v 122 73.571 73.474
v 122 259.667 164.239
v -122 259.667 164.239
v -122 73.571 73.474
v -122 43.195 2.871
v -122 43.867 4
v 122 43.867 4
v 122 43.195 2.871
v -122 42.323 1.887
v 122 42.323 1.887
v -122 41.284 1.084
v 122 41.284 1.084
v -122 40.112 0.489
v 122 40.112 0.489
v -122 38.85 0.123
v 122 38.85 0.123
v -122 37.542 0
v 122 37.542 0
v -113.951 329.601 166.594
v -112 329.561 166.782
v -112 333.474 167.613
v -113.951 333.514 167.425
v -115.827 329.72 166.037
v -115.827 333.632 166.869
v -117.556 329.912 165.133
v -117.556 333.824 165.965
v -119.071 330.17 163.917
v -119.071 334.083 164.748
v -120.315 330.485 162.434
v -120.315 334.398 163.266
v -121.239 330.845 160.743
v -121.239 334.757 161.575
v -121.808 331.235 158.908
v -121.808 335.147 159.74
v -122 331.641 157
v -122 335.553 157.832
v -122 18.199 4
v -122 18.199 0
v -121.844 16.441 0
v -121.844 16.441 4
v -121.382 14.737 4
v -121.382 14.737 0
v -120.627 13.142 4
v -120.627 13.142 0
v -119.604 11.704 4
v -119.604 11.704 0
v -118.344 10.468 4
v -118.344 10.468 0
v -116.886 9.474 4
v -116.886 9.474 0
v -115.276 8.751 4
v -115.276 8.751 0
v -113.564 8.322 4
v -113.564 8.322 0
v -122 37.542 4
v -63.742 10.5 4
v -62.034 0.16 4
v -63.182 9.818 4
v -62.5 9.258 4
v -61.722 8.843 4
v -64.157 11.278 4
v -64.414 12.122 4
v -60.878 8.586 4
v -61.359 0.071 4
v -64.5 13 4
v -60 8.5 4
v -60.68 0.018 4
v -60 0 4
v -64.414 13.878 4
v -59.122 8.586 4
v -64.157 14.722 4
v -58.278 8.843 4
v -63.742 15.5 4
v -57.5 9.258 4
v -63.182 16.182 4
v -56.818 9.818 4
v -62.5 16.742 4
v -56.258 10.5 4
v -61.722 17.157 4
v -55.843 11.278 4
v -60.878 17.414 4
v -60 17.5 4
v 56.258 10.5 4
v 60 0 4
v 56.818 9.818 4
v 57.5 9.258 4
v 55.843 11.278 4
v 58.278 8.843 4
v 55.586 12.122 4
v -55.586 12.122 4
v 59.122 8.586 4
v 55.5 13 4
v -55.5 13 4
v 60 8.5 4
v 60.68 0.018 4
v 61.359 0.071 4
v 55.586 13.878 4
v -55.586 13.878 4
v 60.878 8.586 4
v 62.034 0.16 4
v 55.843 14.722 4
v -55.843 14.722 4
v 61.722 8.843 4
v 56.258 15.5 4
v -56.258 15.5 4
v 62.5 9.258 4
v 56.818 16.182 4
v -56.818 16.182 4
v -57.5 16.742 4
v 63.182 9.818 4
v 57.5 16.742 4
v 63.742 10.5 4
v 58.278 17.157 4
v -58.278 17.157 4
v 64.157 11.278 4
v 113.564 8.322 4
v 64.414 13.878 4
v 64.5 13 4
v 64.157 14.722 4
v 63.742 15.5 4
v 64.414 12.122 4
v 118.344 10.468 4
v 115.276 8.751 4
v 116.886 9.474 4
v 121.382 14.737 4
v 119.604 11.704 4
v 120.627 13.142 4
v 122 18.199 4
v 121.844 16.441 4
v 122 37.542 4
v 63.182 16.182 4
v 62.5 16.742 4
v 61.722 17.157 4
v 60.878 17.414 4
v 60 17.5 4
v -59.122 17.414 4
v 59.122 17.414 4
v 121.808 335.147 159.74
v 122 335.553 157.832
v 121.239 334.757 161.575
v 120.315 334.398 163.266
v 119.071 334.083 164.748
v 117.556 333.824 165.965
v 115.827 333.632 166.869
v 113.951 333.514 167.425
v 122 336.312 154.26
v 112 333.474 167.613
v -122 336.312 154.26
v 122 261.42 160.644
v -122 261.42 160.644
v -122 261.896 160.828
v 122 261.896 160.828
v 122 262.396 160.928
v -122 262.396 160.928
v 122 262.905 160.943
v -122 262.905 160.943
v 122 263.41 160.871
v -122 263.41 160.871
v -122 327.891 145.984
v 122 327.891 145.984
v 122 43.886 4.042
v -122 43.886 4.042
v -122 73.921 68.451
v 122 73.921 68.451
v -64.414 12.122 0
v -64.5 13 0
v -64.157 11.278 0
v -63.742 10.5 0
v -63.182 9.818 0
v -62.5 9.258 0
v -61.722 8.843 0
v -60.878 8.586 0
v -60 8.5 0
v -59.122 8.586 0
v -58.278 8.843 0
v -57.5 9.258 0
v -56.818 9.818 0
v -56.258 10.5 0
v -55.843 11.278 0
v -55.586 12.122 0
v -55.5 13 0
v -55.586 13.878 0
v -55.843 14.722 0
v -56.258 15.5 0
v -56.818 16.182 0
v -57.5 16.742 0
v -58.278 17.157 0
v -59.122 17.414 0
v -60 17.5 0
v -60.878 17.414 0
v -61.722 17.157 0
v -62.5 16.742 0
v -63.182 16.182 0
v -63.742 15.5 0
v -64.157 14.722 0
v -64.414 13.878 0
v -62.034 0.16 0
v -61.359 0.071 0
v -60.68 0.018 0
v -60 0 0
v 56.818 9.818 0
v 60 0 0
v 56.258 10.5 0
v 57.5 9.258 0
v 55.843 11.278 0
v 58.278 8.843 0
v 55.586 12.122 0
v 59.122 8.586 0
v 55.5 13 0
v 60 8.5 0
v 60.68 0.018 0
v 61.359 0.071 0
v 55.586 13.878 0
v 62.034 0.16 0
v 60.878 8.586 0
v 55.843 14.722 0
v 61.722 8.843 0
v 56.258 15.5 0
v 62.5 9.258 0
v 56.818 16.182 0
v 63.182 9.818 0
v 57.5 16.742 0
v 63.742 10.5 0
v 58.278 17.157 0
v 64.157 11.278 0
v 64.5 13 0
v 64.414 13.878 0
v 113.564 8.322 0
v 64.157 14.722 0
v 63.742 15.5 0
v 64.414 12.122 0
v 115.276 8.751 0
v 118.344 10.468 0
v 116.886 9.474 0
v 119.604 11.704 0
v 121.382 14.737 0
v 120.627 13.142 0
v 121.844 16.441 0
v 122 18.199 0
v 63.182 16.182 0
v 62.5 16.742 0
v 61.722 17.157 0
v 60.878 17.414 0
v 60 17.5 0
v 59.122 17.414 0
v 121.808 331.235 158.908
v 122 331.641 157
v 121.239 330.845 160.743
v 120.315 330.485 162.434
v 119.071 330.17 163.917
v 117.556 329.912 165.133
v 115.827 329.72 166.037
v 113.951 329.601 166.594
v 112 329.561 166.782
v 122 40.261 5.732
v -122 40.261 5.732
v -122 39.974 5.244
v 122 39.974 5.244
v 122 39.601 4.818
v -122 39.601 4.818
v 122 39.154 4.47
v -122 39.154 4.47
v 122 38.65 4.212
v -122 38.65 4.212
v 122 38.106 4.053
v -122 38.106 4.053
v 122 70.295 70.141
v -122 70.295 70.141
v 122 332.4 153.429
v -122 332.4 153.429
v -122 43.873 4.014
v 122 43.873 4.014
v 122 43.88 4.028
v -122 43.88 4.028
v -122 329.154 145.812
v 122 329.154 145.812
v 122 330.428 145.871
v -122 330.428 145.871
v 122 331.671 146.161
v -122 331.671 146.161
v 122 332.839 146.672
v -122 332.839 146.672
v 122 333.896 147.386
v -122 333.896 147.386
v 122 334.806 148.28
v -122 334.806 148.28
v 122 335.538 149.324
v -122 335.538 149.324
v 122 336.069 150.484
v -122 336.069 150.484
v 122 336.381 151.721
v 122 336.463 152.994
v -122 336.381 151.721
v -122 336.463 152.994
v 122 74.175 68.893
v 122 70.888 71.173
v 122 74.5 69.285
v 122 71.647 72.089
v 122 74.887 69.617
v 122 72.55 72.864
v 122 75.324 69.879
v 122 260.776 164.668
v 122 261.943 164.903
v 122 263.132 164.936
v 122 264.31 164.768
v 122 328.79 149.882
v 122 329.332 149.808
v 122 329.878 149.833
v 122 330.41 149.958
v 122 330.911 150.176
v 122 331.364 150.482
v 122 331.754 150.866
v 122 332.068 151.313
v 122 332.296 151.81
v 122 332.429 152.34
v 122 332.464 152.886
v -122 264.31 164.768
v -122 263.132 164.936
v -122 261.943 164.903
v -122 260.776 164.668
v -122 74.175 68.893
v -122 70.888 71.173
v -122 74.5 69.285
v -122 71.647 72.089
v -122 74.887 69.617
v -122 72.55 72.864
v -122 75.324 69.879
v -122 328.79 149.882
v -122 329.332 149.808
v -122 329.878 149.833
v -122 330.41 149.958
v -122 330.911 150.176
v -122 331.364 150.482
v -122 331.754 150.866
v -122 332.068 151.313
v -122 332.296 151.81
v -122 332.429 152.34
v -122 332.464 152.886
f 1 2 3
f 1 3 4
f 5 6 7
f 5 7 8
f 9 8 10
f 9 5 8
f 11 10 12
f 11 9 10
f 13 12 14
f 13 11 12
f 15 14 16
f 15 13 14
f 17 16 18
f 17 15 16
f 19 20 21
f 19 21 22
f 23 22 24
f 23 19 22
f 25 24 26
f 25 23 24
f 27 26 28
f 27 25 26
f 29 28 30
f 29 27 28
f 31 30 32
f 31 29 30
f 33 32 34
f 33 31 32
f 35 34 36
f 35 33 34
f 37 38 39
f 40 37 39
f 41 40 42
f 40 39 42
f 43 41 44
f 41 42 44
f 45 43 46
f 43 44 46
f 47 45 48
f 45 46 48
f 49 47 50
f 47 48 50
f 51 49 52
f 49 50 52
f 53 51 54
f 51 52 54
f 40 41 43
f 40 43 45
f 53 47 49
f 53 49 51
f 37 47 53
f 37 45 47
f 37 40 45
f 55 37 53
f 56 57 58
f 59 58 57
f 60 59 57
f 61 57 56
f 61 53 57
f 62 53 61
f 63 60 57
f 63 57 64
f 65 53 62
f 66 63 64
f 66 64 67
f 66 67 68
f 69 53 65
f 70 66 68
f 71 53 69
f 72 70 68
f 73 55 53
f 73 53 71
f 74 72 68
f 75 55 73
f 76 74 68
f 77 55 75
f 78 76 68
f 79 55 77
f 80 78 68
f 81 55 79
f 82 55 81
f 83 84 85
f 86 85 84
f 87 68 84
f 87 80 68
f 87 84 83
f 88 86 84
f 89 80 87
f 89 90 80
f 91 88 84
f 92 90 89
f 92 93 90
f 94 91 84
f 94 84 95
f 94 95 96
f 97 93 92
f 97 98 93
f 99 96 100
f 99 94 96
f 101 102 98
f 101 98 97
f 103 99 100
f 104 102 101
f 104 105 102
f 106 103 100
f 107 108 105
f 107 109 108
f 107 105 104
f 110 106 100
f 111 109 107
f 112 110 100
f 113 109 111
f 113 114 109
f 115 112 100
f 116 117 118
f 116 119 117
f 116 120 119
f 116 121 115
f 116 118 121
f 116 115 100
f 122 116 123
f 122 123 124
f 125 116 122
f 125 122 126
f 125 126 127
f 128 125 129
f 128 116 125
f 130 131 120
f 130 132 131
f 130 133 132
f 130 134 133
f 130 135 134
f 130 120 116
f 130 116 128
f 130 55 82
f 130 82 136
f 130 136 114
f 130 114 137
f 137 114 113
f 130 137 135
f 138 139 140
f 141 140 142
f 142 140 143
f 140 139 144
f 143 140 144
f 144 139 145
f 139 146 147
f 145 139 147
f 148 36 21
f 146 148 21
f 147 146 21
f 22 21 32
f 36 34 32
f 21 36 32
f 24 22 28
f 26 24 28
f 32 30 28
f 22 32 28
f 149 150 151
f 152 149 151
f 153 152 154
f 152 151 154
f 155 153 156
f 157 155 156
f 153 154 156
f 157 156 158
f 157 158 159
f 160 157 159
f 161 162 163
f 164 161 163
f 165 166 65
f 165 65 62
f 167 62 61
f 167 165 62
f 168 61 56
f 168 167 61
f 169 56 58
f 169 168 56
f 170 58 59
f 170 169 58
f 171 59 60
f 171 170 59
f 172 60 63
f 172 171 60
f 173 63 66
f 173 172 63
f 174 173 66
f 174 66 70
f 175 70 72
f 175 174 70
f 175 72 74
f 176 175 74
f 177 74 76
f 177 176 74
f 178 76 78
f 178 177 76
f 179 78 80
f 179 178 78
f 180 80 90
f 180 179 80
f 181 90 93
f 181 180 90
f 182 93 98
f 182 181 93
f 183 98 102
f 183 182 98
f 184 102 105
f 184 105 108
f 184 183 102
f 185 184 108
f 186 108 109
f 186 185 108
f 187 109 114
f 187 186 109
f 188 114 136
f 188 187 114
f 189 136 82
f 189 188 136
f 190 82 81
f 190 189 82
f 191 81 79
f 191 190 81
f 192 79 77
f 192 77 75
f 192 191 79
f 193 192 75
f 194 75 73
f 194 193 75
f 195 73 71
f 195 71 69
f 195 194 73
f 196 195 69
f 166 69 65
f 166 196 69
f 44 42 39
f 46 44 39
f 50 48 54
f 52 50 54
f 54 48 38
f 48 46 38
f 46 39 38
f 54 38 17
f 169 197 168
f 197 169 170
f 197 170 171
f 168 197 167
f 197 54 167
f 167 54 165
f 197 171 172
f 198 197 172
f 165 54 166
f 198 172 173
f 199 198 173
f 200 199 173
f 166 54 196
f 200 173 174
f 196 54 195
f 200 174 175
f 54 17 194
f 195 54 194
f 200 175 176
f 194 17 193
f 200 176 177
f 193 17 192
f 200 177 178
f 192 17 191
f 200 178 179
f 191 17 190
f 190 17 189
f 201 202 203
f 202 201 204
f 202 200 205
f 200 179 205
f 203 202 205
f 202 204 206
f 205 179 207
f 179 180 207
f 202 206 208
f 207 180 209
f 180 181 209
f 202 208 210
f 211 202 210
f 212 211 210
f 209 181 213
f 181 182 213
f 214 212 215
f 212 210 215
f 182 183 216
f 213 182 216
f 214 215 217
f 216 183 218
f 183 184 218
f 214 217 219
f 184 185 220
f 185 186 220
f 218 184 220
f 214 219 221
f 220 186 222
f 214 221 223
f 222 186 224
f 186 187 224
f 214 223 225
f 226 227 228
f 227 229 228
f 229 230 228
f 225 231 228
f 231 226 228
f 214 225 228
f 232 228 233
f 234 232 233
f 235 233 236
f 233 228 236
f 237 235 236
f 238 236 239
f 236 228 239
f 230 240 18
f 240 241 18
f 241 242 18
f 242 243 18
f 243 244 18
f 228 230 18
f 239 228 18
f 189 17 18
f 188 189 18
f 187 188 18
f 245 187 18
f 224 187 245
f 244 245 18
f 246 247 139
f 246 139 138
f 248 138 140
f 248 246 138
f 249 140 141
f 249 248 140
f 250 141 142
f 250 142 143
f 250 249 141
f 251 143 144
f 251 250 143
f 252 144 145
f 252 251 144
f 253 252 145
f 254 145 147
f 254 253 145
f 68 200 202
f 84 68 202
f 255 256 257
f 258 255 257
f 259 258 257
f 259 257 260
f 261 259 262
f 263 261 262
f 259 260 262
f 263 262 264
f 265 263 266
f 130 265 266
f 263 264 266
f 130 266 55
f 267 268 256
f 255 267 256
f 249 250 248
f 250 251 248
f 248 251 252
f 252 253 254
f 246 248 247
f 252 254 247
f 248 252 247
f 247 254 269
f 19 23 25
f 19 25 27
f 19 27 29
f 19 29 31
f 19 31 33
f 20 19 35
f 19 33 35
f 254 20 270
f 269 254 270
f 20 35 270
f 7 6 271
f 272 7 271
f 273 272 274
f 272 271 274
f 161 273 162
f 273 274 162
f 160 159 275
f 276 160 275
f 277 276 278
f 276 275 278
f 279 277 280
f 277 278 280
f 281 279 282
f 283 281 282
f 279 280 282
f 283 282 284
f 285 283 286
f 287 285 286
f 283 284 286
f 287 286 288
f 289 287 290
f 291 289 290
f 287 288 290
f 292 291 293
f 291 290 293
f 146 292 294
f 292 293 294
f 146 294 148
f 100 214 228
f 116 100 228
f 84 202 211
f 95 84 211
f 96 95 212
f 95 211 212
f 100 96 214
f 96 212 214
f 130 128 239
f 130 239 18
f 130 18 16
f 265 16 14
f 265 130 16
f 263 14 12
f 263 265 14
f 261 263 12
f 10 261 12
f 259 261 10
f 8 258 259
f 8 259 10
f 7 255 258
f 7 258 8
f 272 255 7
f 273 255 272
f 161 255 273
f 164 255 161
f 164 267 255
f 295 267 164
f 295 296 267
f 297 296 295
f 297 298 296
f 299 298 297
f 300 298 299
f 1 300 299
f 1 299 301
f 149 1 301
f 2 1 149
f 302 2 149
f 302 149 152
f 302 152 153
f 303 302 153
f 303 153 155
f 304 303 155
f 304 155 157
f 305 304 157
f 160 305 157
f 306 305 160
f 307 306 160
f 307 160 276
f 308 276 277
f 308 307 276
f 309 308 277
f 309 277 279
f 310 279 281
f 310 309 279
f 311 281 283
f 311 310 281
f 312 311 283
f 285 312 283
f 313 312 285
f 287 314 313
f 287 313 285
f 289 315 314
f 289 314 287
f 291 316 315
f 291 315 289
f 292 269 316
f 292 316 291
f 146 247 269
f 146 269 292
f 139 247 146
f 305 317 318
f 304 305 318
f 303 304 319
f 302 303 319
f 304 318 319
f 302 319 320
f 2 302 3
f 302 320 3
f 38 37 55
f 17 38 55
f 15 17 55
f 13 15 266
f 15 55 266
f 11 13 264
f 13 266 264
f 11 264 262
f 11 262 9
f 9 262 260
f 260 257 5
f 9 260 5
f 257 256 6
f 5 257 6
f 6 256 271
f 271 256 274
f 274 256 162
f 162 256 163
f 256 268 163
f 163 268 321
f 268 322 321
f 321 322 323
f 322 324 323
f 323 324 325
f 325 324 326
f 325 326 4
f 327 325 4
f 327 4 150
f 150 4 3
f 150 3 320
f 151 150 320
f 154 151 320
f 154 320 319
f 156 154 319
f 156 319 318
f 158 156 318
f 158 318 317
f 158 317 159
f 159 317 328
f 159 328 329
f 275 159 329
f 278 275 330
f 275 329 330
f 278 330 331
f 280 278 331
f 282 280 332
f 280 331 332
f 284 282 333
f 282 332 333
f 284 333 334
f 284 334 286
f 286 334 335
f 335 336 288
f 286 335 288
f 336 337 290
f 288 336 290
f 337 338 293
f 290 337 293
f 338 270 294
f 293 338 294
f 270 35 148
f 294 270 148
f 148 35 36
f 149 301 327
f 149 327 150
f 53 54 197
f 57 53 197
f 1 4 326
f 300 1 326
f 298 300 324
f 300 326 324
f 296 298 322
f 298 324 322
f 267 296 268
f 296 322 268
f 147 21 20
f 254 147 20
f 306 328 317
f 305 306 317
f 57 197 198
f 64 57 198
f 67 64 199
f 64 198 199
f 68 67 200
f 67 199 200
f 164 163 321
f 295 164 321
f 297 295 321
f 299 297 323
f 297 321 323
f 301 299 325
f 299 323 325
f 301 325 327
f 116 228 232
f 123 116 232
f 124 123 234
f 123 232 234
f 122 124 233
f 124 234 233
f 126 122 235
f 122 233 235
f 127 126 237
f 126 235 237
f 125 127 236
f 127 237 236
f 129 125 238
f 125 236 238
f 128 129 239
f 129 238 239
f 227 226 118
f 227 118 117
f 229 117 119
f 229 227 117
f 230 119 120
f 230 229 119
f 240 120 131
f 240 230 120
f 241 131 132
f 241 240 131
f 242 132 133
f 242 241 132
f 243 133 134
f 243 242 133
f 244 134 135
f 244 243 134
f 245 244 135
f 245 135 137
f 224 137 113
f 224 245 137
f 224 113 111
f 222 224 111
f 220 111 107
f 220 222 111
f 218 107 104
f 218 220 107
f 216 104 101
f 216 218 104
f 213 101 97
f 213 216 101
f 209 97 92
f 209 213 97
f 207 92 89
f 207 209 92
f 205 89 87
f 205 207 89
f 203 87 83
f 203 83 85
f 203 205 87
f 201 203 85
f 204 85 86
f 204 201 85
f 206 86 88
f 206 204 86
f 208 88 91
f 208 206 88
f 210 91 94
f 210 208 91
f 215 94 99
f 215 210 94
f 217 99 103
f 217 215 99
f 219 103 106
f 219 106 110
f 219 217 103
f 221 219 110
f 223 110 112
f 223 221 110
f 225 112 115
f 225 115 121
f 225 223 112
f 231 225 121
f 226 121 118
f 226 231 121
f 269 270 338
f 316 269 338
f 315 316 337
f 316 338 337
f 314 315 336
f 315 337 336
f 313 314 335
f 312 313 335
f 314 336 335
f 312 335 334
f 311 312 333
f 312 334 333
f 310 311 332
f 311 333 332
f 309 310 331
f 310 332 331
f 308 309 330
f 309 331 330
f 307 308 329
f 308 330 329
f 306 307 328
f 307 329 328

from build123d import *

# Parameters (mm, degrees)
SKETCH1_R              = 4.5
EXTRUDE1_DEPTH         = 4
PROCESS_BENDS1_START   = -122
PROCESS_BENDS1_DEPTH   = 244
PROCESS_BENDS1_2_DEPTH = 244
PROCESS_BENDS1_START_2 = 357.035547254
PROCESS_BENDS1_3_DEPTH = 4.964452746


with BuildPart() as part:
    # Sketch1 → Extrude1 (new body)
    with BuildSketch(Plane.XY):
        with BuildLine():
            Line((-60, 0), (60, 0))
            ThreePointArc((60, 0), (61.019968244, 0.040074661), (62.033648046, 0.160051572))
            Line((62.033648046, 0.160051572), (113.56434465, 8.321712114))
            ThreePointArc((113.56434465, 8.321712114), (119.604059656, 11.704115036), (122, 18.19859552))
            Line((122, 18.19859552), (122, 405))
            ThreePointArc((122, 405), (119.071067812, 412.071067812), (112, 415))
            Line((112, 415), (-112, 415))
            ThreePointArc((-112, 415), (-119.071067812, 412.071067812), (-122, 405))
            Line((-122, 405), (-122, 18.19859552))
            ThreePointArc((-122, 18.19859552), (-119.604059656, 11.704115036), (-113.56434465, 8.321712114))
            Line((-113.56434465, 8.321712114), (-62.033648046, 0.160051572))
            ThreePointArc((-62.033648046, 0.160051572), (-61.019968244, 0.040074661), (-60, 0))
        make_face()
        with Locations((60, 13)):
            Circle(SKETCH1_R, mode=Mode.SUBTRACT)
        with Locations(Location((-60, 13, 0), (0, 0, 180))):
            Circle(SKETCH1_R, mode=Mode.SUBTRACT)
    extrude(amount=EXTRUDE1_DEPTH)

    # Process-Bends1: read off the stored shape, not the designer's step
    # Process-Bends1 outline → Process-Bends1 (cut)
    with BuildSketch(Plane.YZ.offset(PROCESS_BENDS1_START)):
        with BuildLine():
            Line((415, 4), (43.866625588, 4))
            ThreePointArc((43.866625588, 4), (41.283727655, 1.083920217), (37.542070268, 0))
            Line((37.542070268, 0), (415, 0))
            Line((415, 0), (415, 4))
        make_face()
    extrude(amount=PROCESS_BENDS1_DEPTH, mode=Mode.SUBTRACT)

    # Process-Bends1 2 outline → Process-Bends1 2 (add)
    with BuildSketch(Plane.YZ.offset(PROCESS_BENDS1_START)):
        with BuildLine():
            Line((333.473997554, 167.613261682), (329.561407151, 166.781614919))
            Line((329.561407151, 166.781614919), (332.399683469, 153.428574691))
            ThreePointArc((332.399683469, 153.428574691), (331.56796846, 150.665088271), (328.790387504, 149.881729425))
            Line((328.790387504, 149.881729425), (264.309892155, 164.768224749))
            ThreePointArc((264.309892155, 164.768224749), (261.942812278, 164.902637285), (259.666636747, 164.239192619))
            Line((259.666636747, 164.239192619), (73.570894156, 73.474234364))
            ThreePointArc((73.570894156, 73.474234364), (71.646739039, 72.08904089), (70.295337674, 70.141003872))
            Line((70.295337674, 70.141003872), (40.260993629, 5.732145215))
            ThreePointArc((40.260993629, 5.732145215), (39.153969093, 4.469825663), (37.542070268, 4))
            Line((37.542070268, 4), (43.866625588, 4))
            ThreePointArc((43.866625588, 4), (43.876459451, 4.020819967), (43.886224777, 4.041672168))
            Line((43.886224777, 4.041672168), (73.920568822, 68.450530825))
            ThreePointArc((73.920568822, 68.450530825), (74.499740836, 69.285403833), (75.324378743, 69.879058179))
            Line((75.324378743, 69.879058179), (261.420121334, 160.644016434))
            ThreePointArc((261.420121334, 160.644016434), (262.395625133, 160.928349862), (263.410087937, 160.87074449))
            Line((263.410087937, 160.87074449), (327.890583287, 145.984249165))
            ThreePointArc((327.890583287, 145.984249165), (334.371605517, 147.812086475), (336.312273872, 154.260221455))
            Line((336.312273872, 154.260221455), (333.473997554, 167.613261682))
        make_face()
    extrude(amount=PROCESS_BENDS1_2_DEPTH)

    # Process-Bends1 3 outline → Process-Bends1 3 (cut)
    with BuildSketch(Plane(origin=(0, 0, 0), x_dir=(1, 0, 0), z_dir=(0, 0.9781476007338049, 0.20791169081776298)).offset(PROCESS_BENDS1_START_2)):
        with BuildLine():
            Line((-122, -94.61736709), (-112, -94.61736709))
            ThreePointArc((-112, -94.61736709), (-119.071067812, -91.688434902), (-122, -84.61736709))
            Line((-122, -84.61736709), (-122, -94.61736709))
        make_face()
        with BuildLine():
            ThreePointArc((122, -84.61736709), (119.071067812, -91.688434902), (112, -94.61736709))
            Line((112, -94.61736709), (122, -94.61736709))
            Line((122, -94.61736709), (122, -84.61736709))
        make_face()
    extrude(amount=PROCESS_BENDS1_3_DEPTH, mode=Mode.SUBTRACT)


solid = part.part
